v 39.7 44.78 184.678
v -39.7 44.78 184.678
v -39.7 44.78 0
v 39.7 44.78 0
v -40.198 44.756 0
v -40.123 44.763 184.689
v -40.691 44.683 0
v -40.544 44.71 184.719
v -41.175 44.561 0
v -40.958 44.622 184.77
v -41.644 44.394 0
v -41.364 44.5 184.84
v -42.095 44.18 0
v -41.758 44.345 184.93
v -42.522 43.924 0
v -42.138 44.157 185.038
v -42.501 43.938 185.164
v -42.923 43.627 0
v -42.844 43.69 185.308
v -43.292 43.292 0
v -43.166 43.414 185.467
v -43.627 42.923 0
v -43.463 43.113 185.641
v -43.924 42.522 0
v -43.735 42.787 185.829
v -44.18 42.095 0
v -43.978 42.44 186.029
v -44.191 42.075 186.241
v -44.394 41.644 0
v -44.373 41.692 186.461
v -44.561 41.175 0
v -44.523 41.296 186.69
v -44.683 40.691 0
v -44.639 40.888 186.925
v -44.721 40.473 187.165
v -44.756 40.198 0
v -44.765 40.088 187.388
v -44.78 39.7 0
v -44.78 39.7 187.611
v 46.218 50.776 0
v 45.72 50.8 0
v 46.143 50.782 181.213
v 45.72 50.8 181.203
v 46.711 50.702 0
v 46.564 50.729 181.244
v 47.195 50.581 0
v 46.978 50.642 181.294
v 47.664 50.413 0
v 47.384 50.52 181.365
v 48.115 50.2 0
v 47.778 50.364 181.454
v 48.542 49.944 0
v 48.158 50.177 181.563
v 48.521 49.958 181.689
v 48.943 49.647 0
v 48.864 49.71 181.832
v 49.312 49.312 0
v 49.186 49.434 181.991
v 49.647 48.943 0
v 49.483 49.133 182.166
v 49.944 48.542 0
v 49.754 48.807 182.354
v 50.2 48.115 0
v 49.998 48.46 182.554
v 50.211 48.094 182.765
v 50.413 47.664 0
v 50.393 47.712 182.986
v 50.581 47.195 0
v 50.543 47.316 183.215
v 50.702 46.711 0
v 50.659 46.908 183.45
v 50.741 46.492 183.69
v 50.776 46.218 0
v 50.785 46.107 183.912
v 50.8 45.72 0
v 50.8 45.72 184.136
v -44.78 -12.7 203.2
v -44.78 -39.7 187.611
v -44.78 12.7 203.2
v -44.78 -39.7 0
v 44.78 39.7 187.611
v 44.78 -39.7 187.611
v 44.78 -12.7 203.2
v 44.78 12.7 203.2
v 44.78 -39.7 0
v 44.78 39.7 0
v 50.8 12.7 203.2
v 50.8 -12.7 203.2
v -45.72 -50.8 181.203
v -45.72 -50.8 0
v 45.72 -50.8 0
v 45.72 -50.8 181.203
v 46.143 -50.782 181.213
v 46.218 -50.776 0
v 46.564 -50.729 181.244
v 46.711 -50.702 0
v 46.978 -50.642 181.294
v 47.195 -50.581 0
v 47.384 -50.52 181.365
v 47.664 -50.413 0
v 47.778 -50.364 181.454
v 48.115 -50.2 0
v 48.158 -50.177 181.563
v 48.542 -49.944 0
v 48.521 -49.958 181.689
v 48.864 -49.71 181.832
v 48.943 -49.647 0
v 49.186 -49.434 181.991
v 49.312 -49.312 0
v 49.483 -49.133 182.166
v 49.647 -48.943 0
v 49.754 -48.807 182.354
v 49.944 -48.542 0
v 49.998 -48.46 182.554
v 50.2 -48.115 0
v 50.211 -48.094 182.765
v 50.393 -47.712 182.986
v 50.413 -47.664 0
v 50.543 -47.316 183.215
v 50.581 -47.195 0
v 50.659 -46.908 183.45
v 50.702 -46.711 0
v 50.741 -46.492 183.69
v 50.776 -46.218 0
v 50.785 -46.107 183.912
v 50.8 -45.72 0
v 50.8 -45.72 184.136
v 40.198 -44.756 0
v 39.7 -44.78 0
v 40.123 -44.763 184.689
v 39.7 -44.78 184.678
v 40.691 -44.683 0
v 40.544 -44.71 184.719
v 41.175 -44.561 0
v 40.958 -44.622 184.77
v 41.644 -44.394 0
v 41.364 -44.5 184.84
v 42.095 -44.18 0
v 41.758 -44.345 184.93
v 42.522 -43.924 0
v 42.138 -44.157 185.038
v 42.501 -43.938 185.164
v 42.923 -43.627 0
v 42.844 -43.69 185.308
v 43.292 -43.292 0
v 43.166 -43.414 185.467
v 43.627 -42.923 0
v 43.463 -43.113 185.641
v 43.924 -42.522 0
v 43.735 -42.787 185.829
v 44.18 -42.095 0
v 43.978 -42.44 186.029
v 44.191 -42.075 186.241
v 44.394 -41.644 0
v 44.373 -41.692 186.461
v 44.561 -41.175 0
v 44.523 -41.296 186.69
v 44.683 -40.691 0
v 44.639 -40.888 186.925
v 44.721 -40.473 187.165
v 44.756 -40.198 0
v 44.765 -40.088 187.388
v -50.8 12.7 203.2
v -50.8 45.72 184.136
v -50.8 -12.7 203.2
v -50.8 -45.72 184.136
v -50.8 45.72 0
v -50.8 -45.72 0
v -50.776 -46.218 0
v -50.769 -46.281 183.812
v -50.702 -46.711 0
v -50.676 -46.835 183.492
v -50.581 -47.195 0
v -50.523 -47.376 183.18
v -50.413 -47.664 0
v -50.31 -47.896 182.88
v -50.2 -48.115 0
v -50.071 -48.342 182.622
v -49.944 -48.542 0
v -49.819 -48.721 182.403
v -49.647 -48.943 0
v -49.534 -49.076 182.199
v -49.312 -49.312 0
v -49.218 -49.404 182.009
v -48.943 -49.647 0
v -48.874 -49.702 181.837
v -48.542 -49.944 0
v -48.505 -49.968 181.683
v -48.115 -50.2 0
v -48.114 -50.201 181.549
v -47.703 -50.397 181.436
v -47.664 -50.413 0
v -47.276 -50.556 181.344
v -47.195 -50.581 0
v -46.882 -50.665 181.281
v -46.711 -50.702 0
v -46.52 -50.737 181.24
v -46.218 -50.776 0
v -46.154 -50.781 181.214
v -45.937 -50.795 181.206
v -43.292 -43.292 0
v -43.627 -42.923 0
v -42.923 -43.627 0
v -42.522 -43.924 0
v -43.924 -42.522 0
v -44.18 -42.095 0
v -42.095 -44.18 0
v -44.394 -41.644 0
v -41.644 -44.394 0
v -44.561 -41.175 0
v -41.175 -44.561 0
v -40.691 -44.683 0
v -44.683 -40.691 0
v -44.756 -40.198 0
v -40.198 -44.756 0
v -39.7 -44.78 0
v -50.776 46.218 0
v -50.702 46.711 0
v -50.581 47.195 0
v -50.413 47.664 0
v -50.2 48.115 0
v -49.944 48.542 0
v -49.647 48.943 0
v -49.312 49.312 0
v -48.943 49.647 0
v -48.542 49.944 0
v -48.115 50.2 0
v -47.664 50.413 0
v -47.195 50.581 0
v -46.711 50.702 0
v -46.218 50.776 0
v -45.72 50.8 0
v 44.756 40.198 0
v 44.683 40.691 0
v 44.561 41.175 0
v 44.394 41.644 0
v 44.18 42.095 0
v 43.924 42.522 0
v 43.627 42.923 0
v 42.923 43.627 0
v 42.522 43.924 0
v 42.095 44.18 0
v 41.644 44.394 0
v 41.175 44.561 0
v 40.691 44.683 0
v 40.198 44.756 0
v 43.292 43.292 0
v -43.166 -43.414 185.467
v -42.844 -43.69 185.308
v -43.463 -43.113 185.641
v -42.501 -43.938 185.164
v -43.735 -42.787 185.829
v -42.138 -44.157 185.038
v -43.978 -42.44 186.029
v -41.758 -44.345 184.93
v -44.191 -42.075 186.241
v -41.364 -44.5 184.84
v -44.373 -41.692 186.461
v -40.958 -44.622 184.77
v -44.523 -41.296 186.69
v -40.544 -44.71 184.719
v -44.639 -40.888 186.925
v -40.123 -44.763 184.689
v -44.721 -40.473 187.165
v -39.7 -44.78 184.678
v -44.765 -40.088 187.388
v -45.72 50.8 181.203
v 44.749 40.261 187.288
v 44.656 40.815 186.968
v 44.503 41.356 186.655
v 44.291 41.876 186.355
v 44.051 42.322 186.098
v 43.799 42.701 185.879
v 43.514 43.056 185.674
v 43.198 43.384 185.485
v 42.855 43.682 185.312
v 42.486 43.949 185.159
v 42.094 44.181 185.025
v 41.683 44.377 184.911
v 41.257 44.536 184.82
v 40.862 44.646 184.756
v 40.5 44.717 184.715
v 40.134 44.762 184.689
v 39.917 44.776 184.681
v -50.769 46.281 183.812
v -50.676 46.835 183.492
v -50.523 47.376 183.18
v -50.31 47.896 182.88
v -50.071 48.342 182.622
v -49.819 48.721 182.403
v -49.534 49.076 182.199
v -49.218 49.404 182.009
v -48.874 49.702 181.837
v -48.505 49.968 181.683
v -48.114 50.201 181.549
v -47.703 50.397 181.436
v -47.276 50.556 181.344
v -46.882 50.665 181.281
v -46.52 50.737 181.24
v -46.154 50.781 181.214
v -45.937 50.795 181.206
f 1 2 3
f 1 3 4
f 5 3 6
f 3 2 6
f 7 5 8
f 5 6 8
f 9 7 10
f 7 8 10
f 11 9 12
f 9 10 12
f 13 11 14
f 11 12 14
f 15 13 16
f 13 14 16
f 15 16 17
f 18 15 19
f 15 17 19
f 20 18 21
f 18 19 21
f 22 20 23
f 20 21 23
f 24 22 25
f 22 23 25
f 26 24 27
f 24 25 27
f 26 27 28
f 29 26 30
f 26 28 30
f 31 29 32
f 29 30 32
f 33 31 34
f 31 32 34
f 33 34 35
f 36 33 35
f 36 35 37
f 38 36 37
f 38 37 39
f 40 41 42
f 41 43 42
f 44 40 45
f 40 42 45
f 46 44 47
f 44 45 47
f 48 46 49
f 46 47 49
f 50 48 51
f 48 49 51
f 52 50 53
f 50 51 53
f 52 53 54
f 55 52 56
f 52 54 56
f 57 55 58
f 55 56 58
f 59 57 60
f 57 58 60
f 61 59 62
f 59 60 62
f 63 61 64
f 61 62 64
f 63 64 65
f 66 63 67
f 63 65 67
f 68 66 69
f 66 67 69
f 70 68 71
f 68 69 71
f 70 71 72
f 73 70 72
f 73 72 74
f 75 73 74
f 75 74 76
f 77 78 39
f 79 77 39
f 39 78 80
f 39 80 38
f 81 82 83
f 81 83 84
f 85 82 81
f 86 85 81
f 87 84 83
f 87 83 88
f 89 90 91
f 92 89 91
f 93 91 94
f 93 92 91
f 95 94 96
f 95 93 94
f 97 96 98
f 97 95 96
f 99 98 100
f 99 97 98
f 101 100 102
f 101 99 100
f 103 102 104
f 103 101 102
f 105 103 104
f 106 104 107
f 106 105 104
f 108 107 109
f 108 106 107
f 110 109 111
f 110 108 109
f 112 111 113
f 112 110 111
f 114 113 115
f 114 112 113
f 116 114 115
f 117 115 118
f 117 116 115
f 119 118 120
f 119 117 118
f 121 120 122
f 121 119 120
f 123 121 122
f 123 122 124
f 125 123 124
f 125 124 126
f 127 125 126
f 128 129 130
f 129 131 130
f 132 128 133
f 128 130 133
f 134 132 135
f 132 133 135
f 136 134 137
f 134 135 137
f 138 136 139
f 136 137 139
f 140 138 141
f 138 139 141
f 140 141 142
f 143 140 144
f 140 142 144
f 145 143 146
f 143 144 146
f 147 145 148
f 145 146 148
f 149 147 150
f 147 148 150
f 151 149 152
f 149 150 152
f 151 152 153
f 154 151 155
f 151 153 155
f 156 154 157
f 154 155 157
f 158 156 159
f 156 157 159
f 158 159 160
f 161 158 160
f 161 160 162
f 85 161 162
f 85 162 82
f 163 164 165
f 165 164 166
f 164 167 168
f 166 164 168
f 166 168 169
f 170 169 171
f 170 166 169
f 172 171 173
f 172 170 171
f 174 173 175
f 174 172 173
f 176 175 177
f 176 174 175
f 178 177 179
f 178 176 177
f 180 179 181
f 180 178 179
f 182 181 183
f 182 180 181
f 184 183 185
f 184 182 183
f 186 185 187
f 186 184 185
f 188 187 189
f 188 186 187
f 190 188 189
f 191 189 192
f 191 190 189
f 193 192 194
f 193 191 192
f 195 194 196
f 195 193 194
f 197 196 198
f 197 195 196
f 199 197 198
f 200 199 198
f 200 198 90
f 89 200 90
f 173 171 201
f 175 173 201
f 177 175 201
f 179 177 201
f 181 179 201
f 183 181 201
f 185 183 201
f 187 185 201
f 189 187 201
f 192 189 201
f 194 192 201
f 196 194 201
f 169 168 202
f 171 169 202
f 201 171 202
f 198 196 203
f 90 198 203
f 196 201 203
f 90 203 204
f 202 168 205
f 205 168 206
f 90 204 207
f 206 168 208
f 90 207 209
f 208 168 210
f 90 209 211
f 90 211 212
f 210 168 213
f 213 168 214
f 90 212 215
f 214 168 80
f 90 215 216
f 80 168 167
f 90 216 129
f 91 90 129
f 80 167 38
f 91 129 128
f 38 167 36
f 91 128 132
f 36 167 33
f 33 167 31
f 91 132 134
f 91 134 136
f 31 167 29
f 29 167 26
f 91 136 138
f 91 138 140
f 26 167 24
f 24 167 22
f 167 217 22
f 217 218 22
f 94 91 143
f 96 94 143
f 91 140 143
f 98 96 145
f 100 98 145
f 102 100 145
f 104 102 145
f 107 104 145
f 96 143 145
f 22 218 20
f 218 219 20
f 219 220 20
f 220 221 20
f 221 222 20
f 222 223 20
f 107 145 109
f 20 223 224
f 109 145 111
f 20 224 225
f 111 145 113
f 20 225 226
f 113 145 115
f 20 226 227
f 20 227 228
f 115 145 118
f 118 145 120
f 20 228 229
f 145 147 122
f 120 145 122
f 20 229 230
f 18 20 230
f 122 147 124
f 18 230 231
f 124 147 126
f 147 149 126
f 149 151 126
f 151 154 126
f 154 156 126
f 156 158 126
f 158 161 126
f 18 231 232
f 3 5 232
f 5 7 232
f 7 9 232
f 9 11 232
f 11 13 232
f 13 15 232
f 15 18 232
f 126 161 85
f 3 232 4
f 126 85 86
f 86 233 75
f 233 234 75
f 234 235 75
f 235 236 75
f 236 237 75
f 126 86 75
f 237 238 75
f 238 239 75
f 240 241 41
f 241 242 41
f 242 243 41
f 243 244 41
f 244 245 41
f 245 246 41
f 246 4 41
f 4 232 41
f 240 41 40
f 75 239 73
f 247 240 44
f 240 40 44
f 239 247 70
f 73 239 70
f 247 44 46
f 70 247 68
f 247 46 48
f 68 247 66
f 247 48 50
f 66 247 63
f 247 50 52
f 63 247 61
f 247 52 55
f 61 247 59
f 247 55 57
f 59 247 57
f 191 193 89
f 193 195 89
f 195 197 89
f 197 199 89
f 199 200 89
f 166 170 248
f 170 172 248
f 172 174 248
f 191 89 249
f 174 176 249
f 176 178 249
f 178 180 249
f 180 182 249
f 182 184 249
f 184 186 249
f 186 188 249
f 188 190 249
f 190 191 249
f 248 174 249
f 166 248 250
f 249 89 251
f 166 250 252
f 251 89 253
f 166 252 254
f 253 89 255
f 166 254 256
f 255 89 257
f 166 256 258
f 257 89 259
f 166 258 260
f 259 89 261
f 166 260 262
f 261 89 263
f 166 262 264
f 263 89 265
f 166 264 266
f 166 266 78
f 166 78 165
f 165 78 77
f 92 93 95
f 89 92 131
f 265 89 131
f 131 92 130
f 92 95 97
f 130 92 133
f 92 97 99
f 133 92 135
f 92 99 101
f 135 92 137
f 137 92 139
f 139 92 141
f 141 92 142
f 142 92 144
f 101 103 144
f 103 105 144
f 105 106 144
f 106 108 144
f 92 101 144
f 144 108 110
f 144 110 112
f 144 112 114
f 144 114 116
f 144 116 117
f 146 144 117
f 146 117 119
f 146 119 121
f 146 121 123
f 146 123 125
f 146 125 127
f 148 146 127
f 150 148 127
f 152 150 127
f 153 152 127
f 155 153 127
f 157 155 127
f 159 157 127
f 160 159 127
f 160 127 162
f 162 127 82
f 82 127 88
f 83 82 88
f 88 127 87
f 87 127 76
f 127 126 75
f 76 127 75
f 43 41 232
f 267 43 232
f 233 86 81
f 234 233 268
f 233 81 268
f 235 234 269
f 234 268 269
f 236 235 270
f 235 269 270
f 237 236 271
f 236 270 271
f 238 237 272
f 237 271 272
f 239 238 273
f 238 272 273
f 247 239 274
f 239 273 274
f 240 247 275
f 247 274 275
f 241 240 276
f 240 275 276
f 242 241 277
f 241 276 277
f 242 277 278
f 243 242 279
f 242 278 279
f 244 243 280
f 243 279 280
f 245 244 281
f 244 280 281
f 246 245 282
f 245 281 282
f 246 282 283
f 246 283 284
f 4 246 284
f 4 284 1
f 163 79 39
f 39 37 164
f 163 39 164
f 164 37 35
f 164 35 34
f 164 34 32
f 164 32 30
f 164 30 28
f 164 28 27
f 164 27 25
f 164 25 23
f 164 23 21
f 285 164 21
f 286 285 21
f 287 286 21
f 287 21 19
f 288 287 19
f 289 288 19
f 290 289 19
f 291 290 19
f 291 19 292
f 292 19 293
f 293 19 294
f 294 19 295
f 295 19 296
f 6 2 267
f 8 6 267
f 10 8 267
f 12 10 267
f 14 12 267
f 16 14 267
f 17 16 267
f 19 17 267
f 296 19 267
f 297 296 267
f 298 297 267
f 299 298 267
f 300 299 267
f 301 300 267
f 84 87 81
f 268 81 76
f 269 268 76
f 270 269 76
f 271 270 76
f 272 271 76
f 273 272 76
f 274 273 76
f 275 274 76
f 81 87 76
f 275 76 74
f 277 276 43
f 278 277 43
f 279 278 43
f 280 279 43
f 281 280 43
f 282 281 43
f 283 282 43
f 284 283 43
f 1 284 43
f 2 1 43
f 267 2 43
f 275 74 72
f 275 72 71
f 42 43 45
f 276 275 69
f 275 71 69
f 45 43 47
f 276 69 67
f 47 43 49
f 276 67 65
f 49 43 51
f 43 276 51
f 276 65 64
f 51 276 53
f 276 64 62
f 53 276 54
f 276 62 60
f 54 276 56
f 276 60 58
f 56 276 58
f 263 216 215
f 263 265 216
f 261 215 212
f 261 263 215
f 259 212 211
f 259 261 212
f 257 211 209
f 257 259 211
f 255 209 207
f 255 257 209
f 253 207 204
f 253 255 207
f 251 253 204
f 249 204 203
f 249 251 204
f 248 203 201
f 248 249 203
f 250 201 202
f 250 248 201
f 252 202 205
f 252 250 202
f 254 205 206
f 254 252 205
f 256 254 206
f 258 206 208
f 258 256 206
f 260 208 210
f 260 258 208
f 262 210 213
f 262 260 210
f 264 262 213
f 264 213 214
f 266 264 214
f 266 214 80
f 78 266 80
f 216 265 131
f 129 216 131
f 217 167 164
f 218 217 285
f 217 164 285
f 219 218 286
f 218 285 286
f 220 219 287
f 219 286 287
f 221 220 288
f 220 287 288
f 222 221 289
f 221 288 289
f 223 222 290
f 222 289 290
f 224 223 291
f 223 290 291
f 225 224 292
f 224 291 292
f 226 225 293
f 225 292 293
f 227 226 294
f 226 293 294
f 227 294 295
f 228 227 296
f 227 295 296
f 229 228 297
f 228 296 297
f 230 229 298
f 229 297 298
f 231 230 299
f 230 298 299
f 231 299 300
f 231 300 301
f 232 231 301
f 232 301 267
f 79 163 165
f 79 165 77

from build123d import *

# Parameters (mm, degrees)
F0_W     = 89.5604
F0_H     = 89.5604
F1_DEPTH = 203.2
F3_DEPTH = 101.6
F4_R     = 5.08


with BuildPart() as f1:
    # F0 (on Top) → F1 (new body)
    with BuildSketch(Plane.XY):
        Polygon((0, 50.8), (-50.8, 50.8), (-50.8, 0), (-50.8, -50.8), (0, -50.8), (50.8, -50.8), (50.8, 0), (50.8, 50.8), align=None)
        Rectangle(F0_W, F0_H, mode=Mode.SUBTRACT)
    extrude(amount=F1_DEPTH)

    # F2 (on face) → F3 (cut)
    with BuildSketch(Plane.YZ.offset(50.8)):
        Polygon((-12.7, 203.2), (-50.8, 203.2), (-50.8, 181.202955), align=None)
        Polygon((50.8, 203.2), (12.7, 203.2), (50.8, 181.202955), align=None)
    extrude(amount=-F3_DEPTH, mode=Mode.SUBTRACT)

    # F4
    f4_edges = [f1.edges().sort_by_distance(p)[0] for p in [
        (-50.8, -50.8, 90.601477),
        (50.8, -50.8, 90.601477),
        (50.8, 50.8, 90.601477),
        (-44.7802, 44.7802, 92.339244),
        (-44.7802, -44.7802, 92.339244),
        (-50.8, 50.8, 90.601477),
        (44.7802, -44.7802, 92.339244),
        (44.7802, 44.7802, 92.339244),
    ]]
    fillet(f4_edges, radius=F4_R)


solid = f1.part
